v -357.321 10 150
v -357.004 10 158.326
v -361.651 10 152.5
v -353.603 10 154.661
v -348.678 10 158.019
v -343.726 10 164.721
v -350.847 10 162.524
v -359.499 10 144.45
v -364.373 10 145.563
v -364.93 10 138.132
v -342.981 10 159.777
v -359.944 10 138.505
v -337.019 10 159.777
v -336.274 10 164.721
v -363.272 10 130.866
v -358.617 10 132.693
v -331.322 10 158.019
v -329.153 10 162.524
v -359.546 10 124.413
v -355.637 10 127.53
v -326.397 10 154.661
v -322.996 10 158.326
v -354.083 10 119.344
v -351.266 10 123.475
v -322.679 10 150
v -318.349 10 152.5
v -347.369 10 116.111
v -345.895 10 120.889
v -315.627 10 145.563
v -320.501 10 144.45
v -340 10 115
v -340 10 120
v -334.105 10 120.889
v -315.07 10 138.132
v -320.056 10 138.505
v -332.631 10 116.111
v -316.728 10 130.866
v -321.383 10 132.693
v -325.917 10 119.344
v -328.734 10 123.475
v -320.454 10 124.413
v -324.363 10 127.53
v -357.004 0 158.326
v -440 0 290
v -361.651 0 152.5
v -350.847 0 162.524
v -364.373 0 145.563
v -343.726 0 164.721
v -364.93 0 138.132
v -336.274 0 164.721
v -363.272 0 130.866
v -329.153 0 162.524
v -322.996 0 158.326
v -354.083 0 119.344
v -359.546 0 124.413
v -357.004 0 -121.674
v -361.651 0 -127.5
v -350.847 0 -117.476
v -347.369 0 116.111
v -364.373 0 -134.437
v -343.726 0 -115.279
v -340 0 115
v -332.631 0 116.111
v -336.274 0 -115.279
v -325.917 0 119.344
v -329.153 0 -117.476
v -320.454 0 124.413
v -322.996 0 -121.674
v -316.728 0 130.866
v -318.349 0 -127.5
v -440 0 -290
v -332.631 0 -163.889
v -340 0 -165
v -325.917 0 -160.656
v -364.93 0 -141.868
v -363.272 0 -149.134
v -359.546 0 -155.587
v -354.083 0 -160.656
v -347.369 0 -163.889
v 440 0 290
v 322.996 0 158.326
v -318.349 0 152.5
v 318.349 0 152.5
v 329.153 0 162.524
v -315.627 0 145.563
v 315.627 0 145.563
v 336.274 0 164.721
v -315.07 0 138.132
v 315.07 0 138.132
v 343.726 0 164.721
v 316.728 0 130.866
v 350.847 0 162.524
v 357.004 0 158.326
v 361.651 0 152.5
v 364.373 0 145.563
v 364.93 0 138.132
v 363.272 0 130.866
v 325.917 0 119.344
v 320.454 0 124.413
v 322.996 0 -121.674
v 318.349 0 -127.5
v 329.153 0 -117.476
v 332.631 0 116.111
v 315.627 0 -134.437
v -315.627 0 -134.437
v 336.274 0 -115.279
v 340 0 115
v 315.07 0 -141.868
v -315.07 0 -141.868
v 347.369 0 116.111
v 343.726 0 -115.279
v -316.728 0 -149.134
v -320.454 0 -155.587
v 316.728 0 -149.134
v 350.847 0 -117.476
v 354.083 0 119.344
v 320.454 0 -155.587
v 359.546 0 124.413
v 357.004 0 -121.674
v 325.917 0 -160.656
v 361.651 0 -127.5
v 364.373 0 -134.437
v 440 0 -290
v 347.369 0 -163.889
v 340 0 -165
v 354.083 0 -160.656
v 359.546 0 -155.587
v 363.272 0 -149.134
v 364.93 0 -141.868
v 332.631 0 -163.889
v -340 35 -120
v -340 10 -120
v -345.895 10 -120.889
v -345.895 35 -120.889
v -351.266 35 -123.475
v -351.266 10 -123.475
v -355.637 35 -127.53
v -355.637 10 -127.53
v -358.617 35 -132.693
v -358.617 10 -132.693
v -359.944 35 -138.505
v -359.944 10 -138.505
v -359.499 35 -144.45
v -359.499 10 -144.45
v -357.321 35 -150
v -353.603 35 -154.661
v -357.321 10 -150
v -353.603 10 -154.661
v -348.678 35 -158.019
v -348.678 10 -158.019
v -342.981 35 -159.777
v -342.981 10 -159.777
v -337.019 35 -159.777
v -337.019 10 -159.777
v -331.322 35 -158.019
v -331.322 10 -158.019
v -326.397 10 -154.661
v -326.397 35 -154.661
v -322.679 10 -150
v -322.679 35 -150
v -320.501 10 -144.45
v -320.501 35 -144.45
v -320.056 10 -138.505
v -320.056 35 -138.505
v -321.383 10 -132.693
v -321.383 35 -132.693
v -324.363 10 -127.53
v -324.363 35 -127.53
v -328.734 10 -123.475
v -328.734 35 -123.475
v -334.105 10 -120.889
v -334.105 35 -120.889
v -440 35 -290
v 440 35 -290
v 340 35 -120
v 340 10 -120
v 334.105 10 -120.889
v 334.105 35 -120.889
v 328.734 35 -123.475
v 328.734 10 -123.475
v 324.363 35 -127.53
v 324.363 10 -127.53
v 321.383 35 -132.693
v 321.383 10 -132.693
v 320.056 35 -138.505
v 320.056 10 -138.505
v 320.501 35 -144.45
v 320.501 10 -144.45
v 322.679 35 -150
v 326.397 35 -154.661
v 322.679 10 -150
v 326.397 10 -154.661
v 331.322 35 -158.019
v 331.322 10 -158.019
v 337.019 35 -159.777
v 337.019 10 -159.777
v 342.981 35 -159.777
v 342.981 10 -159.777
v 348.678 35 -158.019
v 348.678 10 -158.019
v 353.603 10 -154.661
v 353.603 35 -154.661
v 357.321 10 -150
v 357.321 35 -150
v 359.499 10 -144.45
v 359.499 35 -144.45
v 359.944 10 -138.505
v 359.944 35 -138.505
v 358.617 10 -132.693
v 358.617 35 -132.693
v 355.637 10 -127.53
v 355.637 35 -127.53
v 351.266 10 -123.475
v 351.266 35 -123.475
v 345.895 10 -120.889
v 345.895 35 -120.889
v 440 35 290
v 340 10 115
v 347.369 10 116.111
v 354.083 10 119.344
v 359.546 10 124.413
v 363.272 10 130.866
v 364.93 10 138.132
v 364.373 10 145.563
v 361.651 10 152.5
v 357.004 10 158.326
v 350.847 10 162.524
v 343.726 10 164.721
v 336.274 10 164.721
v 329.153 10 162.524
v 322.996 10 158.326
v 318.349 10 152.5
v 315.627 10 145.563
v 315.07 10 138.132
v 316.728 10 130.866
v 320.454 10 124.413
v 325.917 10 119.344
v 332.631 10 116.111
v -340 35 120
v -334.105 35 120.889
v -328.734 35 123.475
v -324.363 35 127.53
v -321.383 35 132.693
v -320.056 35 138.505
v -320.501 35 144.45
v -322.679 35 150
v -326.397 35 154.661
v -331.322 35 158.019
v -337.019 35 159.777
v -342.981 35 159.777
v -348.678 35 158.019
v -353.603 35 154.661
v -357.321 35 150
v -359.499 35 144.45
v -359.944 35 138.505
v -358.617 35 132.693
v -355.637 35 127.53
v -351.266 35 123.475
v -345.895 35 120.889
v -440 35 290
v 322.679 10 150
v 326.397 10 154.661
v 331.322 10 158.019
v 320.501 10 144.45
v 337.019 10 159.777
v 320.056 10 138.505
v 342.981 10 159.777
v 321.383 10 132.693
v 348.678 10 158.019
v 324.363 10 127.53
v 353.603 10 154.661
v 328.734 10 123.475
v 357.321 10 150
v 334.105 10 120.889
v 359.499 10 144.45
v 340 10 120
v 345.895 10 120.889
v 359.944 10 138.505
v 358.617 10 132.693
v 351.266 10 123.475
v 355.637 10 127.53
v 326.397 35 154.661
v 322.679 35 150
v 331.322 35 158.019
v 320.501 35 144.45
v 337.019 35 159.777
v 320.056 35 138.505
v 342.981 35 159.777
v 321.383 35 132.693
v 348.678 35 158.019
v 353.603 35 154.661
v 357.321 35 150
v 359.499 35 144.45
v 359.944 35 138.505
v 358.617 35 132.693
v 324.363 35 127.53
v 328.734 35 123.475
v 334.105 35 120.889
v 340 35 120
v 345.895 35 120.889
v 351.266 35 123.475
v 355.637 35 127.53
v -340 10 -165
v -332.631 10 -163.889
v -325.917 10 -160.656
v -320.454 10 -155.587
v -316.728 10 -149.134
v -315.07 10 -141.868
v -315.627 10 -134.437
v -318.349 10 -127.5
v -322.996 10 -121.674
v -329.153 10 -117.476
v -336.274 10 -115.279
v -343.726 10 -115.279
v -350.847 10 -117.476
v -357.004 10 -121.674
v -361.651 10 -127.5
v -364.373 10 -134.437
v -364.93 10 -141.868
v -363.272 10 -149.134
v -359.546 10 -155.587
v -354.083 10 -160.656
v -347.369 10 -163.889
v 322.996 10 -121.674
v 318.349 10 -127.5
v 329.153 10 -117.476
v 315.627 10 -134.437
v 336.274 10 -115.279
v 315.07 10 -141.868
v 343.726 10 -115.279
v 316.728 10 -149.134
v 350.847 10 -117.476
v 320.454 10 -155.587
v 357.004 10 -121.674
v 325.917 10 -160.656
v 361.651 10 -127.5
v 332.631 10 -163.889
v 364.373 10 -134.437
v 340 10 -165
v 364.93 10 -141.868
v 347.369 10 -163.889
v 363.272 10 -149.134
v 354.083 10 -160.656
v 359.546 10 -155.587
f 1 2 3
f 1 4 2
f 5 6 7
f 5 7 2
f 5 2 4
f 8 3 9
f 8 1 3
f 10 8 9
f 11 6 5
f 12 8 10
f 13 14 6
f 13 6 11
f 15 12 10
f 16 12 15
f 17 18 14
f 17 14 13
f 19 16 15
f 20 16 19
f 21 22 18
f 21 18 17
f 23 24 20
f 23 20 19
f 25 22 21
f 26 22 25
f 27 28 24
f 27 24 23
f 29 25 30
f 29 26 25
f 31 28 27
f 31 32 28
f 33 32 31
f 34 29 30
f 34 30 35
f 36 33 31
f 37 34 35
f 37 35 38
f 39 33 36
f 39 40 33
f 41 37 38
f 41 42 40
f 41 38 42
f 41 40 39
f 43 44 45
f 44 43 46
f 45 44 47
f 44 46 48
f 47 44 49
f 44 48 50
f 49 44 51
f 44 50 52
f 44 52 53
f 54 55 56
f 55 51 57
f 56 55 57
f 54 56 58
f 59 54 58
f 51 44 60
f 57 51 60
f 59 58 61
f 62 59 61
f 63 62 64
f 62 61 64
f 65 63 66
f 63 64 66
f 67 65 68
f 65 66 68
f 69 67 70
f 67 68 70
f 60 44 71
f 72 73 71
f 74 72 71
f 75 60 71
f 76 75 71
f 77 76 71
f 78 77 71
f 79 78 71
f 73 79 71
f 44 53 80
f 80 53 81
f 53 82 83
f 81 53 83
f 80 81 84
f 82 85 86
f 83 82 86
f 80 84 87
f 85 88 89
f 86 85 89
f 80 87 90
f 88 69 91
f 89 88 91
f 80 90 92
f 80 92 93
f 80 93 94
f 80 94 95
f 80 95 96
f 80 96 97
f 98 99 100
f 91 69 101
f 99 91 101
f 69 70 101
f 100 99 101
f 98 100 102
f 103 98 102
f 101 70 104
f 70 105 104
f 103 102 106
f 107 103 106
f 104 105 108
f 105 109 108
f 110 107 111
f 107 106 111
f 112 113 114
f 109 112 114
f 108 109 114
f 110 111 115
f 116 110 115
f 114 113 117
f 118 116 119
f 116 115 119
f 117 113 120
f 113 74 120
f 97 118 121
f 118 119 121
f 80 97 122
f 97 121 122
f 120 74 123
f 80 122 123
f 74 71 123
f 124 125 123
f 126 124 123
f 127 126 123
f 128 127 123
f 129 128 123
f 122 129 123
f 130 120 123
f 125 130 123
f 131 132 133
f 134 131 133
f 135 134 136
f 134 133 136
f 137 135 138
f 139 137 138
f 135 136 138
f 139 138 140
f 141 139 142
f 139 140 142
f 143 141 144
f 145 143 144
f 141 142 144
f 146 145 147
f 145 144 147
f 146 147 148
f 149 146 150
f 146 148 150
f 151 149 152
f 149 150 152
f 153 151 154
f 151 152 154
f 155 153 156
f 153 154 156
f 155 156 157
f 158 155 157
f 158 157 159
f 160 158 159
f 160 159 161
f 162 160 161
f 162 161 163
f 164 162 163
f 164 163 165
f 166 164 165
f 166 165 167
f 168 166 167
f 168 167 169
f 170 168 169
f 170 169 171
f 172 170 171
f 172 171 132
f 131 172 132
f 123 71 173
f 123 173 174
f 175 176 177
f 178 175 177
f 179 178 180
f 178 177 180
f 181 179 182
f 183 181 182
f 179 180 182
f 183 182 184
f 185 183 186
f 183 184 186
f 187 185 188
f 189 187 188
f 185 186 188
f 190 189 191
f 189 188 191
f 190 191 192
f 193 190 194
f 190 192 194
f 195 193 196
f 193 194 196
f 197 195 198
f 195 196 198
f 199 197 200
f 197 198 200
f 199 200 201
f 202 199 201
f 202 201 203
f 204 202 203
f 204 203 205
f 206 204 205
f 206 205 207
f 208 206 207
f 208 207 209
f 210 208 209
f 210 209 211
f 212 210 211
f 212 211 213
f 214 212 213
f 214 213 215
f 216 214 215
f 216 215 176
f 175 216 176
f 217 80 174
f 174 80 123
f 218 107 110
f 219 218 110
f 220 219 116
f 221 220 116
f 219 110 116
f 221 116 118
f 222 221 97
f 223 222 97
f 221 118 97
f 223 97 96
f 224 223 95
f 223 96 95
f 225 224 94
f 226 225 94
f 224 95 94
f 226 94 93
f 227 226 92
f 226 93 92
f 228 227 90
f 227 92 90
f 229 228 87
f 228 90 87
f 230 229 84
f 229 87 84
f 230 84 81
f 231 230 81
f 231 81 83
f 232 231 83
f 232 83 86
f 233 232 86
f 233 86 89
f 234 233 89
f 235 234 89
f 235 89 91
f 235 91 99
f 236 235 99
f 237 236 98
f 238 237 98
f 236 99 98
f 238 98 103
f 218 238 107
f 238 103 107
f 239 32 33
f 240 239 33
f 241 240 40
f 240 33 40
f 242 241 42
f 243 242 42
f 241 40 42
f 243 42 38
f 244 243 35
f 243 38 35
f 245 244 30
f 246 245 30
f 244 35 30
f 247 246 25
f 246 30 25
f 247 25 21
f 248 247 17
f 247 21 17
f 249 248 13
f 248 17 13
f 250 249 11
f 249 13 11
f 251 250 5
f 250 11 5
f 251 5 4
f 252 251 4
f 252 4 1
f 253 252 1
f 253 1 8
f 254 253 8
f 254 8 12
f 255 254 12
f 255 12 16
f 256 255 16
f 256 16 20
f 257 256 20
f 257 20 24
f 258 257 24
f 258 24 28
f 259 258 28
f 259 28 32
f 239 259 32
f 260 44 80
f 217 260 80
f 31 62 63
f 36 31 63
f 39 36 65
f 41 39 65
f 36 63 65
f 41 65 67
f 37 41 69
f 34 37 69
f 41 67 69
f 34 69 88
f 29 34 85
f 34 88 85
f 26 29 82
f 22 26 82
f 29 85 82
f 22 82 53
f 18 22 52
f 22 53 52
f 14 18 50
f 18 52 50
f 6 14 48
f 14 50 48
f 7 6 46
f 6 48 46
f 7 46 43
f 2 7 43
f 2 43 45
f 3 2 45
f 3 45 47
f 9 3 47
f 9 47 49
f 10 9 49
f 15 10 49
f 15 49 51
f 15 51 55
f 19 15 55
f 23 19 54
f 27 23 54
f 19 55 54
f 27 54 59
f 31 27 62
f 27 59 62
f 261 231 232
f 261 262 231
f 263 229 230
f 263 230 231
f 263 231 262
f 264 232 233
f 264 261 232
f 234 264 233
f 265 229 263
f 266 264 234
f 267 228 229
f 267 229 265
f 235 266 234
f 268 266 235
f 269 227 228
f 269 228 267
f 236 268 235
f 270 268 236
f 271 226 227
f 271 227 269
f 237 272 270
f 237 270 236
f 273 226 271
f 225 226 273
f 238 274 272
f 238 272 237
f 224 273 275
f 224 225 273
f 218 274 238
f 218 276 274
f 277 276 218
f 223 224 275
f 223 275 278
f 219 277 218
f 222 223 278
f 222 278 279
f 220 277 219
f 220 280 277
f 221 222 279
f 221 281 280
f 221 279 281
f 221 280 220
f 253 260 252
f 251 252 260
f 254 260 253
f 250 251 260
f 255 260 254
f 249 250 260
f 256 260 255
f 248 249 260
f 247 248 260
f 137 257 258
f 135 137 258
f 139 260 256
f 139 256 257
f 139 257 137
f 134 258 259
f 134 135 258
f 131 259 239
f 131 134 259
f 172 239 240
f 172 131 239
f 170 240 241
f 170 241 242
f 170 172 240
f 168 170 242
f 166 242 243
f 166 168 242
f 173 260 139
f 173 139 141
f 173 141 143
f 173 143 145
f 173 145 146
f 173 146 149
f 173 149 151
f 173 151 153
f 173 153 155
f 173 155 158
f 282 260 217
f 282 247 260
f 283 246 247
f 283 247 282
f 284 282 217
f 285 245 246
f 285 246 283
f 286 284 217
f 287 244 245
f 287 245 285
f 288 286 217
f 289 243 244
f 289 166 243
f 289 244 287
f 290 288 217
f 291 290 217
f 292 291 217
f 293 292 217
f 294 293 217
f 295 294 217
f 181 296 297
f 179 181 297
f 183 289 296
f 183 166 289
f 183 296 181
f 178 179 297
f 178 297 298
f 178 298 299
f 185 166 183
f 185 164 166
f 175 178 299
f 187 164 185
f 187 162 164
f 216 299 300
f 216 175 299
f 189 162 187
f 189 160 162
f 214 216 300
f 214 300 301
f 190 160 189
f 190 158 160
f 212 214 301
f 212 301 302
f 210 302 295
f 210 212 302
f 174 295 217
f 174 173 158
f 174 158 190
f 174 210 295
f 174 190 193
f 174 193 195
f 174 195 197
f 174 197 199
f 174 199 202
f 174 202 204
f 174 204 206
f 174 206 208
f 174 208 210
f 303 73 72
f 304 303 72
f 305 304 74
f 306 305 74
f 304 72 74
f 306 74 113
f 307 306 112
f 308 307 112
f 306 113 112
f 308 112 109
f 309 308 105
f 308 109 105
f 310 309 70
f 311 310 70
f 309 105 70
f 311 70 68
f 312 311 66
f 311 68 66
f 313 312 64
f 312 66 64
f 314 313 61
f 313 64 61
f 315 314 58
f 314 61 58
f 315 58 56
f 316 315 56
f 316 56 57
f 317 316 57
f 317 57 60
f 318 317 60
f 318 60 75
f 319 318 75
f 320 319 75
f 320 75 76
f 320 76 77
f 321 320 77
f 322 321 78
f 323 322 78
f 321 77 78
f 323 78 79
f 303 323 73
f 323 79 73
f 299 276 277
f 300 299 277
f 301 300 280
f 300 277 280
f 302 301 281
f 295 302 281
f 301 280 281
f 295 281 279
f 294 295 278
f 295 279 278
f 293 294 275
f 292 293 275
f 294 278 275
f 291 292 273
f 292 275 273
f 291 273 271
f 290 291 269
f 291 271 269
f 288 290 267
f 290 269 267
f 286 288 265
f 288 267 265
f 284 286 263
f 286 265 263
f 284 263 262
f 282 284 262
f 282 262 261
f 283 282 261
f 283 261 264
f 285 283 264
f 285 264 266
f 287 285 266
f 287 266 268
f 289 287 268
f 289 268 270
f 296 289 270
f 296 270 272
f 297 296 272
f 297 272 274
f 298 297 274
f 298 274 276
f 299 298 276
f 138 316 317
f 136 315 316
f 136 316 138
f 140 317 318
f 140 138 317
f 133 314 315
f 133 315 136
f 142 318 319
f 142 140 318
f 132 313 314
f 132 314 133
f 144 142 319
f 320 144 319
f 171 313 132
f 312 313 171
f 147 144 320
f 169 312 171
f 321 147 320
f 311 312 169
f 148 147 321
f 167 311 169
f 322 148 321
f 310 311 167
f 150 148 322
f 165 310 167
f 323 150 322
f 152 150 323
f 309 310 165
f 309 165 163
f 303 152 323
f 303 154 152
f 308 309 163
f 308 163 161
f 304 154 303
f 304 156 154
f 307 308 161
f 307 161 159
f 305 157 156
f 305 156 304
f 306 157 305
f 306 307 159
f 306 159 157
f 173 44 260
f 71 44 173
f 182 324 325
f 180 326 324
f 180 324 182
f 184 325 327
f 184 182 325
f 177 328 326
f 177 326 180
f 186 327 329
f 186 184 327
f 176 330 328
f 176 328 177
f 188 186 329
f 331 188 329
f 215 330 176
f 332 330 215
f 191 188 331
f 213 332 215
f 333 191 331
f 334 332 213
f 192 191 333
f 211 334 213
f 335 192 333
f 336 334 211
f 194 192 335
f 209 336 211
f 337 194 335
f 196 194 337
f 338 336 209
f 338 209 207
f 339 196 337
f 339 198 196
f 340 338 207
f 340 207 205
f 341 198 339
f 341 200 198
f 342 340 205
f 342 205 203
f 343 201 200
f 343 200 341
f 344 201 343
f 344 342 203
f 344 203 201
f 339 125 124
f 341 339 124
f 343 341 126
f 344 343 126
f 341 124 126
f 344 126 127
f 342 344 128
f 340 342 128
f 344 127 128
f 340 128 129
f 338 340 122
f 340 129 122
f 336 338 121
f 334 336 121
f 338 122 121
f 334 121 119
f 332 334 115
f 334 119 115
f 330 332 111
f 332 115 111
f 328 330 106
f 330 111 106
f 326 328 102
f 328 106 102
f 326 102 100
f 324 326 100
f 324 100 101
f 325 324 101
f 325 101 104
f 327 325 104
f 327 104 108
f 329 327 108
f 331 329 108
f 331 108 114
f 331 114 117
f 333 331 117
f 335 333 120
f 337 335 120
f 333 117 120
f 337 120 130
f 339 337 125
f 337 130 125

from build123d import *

# Parameters (mm, degrees)
SKETCH1_W           = 880
SKETCH1_H           = 580
BOSS_EXTRUDE1_DEPTH = 35
SKETCH2_R           = 20
CUT_EXTRUDE1_DEPTH  = 202
SKETCH3_R           = 25
CUT_EXTRUDE2_DEPTH  = 10


with BuildPart() as part:
    # Sketch1 → Boss-Extrude1 (new body)
    with BuildSketch(Plane(origin=(0, 0, 0), x_dir=(1, 0, 0), z_dir=(0, 1, 0))):
        Rectangle(SKETCH1_W, SKETCH1_H)
    extrude(amount=BOSS_EXTRUDE1_DEPTH)

    # Sketch2 → Cut-Extrude1 (cut)
    with BuildSketch(Plane.XZ):
        with Locations(Location((-340, 140, 0), (0, 0, 270))):
            Circle(SKETCH2_R)
        with Locations(Location((340, 140, 0), (0, 0, 270))):
            Circle(SKETCH2_R)
        with Locations(Location((340, -140, 0), (0, 0, 90))):
            Circle(SKETCH2_R)
        with Locations(Location((-340, -140, 0), (0, 0, 90))):
            Circle(SKETCH2_R)
    extrude(amount=-CUT_EXTRUDE1_DEPTH, mode=Mode.SUBTRACT)

    # Sketch3 → Cut-Extrude2 (cut)
    with BuildSketch(Plane.XZ):
        with Locations(Location((-340, 140, 0), (0, 0, 270))):
            Circle(SKETCH3_R)
        with Locations(Location((340, 140, 0), (0, 0, 270))):
            Circle(SKETCH3_R)
        with Locations(Location((340, -140, 0), (0, 0, 270))):
            Circle(SKETCH3_R)
        with Locations(Location((-340, -140, 0), (0, 0, 270))):
            Circle(SKETCH3_R)
    extrude(amount=-CUT_EXTRUDE2_DEPTH, mode=Mode.SUBTRACT)


solid = part.part
